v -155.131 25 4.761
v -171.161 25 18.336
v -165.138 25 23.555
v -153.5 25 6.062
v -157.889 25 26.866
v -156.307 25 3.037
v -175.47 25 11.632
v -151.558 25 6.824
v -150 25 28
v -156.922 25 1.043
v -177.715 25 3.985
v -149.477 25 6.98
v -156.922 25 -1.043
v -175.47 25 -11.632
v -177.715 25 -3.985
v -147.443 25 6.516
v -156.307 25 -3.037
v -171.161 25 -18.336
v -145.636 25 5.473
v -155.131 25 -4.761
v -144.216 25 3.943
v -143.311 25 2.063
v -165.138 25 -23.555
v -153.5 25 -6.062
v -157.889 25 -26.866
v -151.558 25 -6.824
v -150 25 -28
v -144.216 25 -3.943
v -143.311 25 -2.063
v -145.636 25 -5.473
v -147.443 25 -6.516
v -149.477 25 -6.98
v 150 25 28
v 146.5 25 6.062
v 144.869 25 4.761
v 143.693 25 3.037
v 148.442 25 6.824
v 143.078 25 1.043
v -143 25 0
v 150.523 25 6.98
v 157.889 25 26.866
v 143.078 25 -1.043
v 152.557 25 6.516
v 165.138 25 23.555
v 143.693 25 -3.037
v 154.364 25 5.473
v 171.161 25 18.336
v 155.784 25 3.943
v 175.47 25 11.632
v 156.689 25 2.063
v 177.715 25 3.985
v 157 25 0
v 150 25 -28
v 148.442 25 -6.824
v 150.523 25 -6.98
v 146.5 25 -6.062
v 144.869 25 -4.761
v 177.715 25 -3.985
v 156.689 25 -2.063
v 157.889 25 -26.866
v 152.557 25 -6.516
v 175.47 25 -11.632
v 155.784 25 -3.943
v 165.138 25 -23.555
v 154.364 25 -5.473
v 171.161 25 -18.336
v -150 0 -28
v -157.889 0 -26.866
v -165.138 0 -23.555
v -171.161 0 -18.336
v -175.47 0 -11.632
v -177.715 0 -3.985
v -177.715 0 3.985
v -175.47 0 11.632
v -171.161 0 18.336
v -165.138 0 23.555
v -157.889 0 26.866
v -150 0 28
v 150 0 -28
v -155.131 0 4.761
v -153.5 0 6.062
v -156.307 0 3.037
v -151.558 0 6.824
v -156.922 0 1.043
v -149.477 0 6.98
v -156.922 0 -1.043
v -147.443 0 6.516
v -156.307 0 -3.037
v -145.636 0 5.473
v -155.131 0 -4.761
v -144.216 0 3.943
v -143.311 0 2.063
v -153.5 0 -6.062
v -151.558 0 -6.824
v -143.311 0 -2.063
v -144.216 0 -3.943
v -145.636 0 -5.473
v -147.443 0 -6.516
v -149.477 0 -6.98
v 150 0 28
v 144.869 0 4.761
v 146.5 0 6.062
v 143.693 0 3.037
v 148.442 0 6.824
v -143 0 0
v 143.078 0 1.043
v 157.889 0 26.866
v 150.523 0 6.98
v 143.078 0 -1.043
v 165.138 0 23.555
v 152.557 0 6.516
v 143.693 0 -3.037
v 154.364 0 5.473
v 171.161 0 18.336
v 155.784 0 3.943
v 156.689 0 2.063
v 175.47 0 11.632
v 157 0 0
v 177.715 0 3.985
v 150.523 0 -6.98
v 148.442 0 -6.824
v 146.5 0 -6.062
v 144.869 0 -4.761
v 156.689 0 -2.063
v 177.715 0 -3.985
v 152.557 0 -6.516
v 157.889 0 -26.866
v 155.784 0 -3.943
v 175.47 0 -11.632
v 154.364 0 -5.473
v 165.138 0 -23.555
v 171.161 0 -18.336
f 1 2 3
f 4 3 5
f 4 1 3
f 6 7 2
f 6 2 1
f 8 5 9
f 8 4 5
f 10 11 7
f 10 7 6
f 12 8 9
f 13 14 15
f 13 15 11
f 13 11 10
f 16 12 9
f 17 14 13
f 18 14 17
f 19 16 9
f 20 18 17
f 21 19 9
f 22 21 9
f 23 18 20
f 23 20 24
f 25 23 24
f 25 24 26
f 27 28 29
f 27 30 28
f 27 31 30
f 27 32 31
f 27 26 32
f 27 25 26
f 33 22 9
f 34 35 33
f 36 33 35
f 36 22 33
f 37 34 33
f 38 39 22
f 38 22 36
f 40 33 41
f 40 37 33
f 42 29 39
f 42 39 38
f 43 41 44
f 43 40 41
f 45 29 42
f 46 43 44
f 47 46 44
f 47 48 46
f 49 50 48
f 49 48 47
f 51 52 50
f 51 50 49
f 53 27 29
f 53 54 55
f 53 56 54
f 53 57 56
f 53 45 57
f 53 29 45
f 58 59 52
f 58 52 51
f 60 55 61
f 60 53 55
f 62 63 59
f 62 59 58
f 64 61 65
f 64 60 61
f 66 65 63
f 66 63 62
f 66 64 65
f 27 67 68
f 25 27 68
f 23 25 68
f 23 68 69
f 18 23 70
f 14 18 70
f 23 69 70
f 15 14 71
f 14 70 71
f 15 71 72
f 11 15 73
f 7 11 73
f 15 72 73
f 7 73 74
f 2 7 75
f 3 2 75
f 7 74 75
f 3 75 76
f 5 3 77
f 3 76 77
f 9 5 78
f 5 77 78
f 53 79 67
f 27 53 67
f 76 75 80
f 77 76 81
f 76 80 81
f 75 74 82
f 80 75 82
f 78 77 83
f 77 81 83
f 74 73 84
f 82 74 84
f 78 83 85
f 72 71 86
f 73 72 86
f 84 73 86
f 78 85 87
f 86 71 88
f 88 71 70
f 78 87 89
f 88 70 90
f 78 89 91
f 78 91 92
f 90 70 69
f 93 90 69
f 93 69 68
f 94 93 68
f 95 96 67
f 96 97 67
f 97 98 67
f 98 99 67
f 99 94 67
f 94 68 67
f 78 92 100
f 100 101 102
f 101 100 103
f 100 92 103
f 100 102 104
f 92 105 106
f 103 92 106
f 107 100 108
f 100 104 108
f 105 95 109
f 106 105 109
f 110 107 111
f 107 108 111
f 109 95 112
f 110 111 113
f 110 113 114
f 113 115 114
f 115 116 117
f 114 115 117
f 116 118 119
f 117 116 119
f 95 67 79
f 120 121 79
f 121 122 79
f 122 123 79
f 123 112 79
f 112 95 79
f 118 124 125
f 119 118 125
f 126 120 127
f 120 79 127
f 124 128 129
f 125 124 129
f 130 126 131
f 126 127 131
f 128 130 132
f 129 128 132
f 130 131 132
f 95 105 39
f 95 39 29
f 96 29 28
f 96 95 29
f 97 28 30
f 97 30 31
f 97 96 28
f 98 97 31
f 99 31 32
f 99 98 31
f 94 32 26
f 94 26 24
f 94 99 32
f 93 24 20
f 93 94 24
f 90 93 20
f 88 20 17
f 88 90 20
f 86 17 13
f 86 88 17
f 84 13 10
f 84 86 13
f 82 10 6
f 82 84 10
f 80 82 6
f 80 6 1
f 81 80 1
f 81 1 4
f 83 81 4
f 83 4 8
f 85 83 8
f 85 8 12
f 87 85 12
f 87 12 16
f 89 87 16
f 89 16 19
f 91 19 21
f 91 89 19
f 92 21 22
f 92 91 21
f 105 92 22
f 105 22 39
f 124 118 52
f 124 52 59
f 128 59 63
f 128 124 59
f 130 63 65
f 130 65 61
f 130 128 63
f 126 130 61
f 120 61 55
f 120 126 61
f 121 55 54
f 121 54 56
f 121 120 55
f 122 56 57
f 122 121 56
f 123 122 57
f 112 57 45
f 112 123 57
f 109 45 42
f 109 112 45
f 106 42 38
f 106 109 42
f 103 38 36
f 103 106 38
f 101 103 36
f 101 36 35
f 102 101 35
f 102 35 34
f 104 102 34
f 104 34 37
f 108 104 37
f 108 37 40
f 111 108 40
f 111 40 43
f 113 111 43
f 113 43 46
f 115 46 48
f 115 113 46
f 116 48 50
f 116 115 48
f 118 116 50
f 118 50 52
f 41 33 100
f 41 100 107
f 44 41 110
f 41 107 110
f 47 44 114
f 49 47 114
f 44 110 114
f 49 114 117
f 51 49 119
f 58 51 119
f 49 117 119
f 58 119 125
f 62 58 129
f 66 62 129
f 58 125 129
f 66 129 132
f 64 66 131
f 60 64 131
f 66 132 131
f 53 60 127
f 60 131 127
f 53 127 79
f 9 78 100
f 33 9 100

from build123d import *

# Parameters (mm, degrees)
SKETCH_1_R      = 28
SKETCH_1_R_2    = 7
EXTRUDE_1_DEPTH = 25


with BuildPart() as part:
    # 草图1 → 凸台-拉伸1 (new body)
    with BuildSketch(Plane(origin=(0, 0, 0), x_dir=(1, 0, 0), z_dir=(0, 1, 0))):
        with BuildLine():
            Line((150, 28), (-150, 28))
            ThreePointArc((-150, 28), (-130.201010127, 19.798989873), (-122, 0))
            ThreePointArc((-122, 0), (-130.201010127, -19.798989873), (-150, -28))
            Line((-150, -28), (150, -28))
            ThreePointArc((150, -28), (122, 0), (150, 28))
        make_face()
        with Locations((150, 0)):
            Circle(SKETCH_1_R)
        with Locations((150, 0)):
            Circle(SKETCH_1_R_2, mode=Mode.SUBTRACT)
        with Locations((-150, 0)):
            Circle(SKETCH_1_R)
        with Locations((-150, 0)):
            Circle(SKETCH_1_R_2, mode=Mode.SUBTRACT)
    extrude(amount=EXTRUDE_1_DEPTH)


solid = part.part
